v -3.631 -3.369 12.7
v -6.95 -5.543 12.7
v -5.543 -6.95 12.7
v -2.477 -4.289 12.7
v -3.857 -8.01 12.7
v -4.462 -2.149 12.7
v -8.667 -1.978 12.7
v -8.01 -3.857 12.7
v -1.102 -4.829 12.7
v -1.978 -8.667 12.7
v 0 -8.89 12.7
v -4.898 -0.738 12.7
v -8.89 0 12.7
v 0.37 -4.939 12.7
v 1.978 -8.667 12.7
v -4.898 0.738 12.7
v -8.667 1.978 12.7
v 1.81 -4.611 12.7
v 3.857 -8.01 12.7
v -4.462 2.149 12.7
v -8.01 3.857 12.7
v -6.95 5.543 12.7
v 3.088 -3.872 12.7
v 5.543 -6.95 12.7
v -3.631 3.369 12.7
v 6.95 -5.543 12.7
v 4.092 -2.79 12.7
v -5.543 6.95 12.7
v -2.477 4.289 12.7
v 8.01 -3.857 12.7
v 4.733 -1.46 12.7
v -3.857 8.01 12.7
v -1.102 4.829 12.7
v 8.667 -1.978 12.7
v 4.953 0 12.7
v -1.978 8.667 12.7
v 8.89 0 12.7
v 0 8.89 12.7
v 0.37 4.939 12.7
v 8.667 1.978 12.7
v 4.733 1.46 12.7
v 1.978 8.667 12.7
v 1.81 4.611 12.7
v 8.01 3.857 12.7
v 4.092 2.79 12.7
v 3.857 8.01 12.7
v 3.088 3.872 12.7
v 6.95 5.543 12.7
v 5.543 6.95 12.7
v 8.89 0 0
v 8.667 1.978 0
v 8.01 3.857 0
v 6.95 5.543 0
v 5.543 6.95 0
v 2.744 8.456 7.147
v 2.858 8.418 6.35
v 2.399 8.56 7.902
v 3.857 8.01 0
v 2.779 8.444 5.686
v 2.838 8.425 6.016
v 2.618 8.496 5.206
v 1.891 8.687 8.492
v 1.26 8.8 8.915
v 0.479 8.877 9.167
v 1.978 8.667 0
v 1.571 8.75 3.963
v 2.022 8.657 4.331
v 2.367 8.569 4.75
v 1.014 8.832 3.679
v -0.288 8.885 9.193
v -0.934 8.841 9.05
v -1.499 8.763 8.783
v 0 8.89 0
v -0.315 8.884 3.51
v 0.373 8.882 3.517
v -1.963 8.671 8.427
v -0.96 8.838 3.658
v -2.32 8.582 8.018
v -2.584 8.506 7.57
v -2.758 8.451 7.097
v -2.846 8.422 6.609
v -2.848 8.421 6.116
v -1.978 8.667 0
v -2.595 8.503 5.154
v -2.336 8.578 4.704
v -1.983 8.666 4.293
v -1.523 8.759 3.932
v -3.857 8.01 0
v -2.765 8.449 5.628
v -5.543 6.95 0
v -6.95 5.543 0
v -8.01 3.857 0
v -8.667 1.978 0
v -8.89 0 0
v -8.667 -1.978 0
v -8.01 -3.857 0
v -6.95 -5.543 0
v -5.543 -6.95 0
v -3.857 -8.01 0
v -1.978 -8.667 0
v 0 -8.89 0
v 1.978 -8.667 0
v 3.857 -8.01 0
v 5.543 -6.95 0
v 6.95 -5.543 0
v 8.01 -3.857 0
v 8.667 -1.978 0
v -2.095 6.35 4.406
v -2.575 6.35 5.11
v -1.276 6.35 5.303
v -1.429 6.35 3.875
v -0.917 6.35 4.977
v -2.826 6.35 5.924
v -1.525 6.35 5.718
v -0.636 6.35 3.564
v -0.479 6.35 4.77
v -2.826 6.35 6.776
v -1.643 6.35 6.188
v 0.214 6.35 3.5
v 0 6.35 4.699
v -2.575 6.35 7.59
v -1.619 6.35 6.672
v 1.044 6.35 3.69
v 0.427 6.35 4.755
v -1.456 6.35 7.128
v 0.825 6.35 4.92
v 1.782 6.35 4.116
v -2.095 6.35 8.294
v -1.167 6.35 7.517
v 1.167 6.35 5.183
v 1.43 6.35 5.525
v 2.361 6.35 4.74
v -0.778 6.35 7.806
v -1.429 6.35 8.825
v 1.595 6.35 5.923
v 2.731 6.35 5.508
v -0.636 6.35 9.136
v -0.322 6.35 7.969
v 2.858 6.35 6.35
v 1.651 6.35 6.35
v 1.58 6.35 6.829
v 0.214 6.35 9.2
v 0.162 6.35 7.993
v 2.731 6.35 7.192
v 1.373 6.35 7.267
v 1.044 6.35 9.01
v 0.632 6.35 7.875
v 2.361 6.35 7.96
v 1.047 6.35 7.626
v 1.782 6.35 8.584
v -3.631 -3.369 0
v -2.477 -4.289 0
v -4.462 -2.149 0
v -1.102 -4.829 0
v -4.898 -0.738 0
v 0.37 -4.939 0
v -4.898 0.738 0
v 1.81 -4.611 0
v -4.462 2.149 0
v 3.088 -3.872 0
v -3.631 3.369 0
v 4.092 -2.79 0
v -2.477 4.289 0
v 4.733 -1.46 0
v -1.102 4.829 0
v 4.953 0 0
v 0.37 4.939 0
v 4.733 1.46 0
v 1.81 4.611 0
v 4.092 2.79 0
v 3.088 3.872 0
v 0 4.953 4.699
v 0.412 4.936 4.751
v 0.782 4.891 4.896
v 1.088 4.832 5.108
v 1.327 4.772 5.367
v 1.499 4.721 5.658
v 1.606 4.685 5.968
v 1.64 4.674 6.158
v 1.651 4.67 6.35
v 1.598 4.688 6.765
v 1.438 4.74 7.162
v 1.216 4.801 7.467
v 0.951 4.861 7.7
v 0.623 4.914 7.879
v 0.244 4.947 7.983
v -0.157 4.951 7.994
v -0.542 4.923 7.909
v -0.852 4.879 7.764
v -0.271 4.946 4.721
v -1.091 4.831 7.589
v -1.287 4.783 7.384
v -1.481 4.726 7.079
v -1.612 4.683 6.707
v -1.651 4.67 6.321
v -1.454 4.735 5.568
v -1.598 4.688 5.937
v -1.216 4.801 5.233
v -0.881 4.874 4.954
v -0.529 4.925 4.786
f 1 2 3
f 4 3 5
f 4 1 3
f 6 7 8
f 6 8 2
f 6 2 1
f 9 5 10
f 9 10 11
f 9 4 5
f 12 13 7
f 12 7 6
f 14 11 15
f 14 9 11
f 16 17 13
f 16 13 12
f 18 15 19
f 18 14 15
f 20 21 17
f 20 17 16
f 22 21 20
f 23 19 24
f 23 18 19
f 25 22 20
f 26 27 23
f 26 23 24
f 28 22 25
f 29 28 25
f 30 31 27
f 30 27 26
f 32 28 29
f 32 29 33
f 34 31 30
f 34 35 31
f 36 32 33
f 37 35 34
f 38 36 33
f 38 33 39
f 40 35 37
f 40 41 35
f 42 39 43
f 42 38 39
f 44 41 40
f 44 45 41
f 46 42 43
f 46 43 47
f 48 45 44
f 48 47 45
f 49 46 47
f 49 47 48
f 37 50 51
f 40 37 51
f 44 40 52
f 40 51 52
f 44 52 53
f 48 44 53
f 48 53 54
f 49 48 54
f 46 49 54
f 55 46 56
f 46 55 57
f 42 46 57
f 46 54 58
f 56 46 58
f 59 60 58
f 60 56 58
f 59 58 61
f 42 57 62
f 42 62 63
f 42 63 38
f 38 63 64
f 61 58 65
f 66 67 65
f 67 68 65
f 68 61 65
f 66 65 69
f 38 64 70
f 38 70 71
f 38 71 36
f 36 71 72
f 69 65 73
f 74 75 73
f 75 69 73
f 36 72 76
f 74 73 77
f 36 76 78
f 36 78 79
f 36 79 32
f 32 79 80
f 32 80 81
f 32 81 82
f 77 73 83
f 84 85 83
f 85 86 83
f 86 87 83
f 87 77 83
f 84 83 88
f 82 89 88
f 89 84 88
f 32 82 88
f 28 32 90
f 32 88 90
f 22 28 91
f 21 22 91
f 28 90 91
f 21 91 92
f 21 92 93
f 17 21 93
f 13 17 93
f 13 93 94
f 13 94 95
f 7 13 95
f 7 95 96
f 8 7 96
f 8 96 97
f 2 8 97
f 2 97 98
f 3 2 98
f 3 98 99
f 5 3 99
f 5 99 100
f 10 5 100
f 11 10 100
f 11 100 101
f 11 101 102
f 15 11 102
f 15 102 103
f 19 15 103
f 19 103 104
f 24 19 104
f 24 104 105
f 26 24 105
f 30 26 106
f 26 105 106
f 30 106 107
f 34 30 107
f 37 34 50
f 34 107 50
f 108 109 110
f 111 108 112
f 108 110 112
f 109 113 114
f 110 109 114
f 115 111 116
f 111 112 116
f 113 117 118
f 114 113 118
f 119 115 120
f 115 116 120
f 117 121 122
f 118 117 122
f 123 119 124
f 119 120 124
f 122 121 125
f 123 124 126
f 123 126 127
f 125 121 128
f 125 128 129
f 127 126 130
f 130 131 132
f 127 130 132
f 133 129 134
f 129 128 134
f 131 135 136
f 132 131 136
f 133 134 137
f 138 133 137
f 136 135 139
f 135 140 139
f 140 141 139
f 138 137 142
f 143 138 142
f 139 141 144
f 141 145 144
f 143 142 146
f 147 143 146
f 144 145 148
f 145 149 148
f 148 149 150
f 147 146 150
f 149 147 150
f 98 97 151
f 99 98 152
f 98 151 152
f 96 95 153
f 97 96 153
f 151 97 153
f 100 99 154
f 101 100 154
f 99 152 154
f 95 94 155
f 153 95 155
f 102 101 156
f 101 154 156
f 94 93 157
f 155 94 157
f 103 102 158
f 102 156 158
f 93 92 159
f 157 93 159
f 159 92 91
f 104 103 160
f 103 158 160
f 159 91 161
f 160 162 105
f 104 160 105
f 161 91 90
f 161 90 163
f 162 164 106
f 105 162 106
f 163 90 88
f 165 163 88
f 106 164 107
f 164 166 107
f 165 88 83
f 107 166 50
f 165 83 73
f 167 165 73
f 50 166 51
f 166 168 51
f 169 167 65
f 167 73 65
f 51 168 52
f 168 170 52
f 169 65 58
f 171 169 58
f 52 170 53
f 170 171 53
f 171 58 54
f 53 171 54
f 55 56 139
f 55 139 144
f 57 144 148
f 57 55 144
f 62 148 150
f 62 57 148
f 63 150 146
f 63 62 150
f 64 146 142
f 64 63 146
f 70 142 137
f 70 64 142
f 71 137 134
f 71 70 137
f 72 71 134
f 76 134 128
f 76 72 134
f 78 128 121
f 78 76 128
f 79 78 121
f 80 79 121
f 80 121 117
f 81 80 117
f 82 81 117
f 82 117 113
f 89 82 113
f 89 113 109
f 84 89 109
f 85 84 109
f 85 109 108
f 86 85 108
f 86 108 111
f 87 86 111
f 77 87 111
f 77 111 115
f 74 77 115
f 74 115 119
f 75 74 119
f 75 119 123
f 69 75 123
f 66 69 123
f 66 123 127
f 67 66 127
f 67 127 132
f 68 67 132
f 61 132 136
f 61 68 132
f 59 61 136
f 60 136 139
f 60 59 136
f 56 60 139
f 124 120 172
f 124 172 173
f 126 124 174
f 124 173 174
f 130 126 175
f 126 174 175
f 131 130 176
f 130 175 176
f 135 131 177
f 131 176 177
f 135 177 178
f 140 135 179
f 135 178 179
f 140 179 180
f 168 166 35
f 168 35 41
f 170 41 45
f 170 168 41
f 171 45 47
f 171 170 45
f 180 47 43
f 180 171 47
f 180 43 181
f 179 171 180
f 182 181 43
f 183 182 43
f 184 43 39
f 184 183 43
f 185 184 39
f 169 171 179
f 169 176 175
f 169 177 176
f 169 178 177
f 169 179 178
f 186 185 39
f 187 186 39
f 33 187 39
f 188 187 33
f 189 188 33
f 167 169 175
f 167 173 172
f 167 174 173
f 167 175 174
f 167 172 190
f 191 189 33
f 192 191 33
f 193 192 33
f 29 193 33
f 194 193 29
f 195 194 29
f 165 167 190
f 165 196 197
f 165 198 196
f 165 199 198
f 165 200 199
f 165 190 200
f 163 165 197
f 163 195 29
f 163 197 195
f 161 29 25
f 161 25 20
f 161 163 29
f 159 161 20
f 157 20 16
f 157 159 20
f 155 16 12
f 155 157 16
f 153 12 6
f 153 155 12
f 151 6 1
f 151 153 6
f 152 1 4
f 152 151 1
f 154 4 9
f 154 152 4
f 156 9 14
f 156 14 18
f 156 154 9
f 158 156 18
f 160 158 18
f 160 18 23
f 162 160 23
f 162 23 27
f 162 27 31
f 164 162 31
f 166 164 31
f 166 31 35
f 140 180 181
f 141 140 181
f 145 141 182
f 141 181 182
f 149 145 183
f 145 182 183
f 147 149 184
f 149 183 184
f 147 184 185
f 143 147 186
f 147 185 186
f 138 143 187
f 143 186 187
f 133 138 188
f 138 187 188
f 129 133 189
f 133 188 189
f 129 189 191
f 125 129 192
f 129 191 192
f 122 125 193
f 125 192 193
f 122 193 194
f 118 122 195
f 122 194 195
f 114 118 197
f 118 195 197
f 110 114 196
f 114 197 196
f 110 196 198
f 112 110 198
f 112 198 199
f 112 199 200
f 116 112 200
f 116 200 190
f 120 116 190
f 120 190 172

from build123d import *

# Parameters (mm, degrees)
F0_R     = 8.89
F0_R_2   = 4.953
F1_DEPTH = 12.7
F3_DEPTH = 25.4
F5_R     = 2.8575
F6_DEPTH = 2.54


with BuildPart() as f1:
    # F0 (on Top) → F1 (new body)
    with BuildSketch(Plane.XY):
        Circle(F0_R)
        Circle(F0_R_2, mode=Mode.SUBTRACT)
    extrude(amount=F1_DEPTH)

    # F2 (on Front) → F3 (cut)
    with BuildSketch(Plane.XZ):
        with BuildLine():
            ThreePointArc((0, 4.699), (1.167433, 5.182567), (1.651, 6.35))
            ThreePointArc((1.651, 6.35), (-1.167433, 7.517433), (0, 4.699))
        make_face()
    extrude(amount=-F3_DEPTH, mode=Mode.SUBTRACT)

    # F5 (on offset) → F6 (cut)
    with BuildSketch(Plane.XZ.offset(-8.89)):
        with Locations((0, 6.35)):
            Circle(F5_R)
    extrude(amount=F6_DEPTH, mode=Mode.SUBTRACT)


solid = f1.part
